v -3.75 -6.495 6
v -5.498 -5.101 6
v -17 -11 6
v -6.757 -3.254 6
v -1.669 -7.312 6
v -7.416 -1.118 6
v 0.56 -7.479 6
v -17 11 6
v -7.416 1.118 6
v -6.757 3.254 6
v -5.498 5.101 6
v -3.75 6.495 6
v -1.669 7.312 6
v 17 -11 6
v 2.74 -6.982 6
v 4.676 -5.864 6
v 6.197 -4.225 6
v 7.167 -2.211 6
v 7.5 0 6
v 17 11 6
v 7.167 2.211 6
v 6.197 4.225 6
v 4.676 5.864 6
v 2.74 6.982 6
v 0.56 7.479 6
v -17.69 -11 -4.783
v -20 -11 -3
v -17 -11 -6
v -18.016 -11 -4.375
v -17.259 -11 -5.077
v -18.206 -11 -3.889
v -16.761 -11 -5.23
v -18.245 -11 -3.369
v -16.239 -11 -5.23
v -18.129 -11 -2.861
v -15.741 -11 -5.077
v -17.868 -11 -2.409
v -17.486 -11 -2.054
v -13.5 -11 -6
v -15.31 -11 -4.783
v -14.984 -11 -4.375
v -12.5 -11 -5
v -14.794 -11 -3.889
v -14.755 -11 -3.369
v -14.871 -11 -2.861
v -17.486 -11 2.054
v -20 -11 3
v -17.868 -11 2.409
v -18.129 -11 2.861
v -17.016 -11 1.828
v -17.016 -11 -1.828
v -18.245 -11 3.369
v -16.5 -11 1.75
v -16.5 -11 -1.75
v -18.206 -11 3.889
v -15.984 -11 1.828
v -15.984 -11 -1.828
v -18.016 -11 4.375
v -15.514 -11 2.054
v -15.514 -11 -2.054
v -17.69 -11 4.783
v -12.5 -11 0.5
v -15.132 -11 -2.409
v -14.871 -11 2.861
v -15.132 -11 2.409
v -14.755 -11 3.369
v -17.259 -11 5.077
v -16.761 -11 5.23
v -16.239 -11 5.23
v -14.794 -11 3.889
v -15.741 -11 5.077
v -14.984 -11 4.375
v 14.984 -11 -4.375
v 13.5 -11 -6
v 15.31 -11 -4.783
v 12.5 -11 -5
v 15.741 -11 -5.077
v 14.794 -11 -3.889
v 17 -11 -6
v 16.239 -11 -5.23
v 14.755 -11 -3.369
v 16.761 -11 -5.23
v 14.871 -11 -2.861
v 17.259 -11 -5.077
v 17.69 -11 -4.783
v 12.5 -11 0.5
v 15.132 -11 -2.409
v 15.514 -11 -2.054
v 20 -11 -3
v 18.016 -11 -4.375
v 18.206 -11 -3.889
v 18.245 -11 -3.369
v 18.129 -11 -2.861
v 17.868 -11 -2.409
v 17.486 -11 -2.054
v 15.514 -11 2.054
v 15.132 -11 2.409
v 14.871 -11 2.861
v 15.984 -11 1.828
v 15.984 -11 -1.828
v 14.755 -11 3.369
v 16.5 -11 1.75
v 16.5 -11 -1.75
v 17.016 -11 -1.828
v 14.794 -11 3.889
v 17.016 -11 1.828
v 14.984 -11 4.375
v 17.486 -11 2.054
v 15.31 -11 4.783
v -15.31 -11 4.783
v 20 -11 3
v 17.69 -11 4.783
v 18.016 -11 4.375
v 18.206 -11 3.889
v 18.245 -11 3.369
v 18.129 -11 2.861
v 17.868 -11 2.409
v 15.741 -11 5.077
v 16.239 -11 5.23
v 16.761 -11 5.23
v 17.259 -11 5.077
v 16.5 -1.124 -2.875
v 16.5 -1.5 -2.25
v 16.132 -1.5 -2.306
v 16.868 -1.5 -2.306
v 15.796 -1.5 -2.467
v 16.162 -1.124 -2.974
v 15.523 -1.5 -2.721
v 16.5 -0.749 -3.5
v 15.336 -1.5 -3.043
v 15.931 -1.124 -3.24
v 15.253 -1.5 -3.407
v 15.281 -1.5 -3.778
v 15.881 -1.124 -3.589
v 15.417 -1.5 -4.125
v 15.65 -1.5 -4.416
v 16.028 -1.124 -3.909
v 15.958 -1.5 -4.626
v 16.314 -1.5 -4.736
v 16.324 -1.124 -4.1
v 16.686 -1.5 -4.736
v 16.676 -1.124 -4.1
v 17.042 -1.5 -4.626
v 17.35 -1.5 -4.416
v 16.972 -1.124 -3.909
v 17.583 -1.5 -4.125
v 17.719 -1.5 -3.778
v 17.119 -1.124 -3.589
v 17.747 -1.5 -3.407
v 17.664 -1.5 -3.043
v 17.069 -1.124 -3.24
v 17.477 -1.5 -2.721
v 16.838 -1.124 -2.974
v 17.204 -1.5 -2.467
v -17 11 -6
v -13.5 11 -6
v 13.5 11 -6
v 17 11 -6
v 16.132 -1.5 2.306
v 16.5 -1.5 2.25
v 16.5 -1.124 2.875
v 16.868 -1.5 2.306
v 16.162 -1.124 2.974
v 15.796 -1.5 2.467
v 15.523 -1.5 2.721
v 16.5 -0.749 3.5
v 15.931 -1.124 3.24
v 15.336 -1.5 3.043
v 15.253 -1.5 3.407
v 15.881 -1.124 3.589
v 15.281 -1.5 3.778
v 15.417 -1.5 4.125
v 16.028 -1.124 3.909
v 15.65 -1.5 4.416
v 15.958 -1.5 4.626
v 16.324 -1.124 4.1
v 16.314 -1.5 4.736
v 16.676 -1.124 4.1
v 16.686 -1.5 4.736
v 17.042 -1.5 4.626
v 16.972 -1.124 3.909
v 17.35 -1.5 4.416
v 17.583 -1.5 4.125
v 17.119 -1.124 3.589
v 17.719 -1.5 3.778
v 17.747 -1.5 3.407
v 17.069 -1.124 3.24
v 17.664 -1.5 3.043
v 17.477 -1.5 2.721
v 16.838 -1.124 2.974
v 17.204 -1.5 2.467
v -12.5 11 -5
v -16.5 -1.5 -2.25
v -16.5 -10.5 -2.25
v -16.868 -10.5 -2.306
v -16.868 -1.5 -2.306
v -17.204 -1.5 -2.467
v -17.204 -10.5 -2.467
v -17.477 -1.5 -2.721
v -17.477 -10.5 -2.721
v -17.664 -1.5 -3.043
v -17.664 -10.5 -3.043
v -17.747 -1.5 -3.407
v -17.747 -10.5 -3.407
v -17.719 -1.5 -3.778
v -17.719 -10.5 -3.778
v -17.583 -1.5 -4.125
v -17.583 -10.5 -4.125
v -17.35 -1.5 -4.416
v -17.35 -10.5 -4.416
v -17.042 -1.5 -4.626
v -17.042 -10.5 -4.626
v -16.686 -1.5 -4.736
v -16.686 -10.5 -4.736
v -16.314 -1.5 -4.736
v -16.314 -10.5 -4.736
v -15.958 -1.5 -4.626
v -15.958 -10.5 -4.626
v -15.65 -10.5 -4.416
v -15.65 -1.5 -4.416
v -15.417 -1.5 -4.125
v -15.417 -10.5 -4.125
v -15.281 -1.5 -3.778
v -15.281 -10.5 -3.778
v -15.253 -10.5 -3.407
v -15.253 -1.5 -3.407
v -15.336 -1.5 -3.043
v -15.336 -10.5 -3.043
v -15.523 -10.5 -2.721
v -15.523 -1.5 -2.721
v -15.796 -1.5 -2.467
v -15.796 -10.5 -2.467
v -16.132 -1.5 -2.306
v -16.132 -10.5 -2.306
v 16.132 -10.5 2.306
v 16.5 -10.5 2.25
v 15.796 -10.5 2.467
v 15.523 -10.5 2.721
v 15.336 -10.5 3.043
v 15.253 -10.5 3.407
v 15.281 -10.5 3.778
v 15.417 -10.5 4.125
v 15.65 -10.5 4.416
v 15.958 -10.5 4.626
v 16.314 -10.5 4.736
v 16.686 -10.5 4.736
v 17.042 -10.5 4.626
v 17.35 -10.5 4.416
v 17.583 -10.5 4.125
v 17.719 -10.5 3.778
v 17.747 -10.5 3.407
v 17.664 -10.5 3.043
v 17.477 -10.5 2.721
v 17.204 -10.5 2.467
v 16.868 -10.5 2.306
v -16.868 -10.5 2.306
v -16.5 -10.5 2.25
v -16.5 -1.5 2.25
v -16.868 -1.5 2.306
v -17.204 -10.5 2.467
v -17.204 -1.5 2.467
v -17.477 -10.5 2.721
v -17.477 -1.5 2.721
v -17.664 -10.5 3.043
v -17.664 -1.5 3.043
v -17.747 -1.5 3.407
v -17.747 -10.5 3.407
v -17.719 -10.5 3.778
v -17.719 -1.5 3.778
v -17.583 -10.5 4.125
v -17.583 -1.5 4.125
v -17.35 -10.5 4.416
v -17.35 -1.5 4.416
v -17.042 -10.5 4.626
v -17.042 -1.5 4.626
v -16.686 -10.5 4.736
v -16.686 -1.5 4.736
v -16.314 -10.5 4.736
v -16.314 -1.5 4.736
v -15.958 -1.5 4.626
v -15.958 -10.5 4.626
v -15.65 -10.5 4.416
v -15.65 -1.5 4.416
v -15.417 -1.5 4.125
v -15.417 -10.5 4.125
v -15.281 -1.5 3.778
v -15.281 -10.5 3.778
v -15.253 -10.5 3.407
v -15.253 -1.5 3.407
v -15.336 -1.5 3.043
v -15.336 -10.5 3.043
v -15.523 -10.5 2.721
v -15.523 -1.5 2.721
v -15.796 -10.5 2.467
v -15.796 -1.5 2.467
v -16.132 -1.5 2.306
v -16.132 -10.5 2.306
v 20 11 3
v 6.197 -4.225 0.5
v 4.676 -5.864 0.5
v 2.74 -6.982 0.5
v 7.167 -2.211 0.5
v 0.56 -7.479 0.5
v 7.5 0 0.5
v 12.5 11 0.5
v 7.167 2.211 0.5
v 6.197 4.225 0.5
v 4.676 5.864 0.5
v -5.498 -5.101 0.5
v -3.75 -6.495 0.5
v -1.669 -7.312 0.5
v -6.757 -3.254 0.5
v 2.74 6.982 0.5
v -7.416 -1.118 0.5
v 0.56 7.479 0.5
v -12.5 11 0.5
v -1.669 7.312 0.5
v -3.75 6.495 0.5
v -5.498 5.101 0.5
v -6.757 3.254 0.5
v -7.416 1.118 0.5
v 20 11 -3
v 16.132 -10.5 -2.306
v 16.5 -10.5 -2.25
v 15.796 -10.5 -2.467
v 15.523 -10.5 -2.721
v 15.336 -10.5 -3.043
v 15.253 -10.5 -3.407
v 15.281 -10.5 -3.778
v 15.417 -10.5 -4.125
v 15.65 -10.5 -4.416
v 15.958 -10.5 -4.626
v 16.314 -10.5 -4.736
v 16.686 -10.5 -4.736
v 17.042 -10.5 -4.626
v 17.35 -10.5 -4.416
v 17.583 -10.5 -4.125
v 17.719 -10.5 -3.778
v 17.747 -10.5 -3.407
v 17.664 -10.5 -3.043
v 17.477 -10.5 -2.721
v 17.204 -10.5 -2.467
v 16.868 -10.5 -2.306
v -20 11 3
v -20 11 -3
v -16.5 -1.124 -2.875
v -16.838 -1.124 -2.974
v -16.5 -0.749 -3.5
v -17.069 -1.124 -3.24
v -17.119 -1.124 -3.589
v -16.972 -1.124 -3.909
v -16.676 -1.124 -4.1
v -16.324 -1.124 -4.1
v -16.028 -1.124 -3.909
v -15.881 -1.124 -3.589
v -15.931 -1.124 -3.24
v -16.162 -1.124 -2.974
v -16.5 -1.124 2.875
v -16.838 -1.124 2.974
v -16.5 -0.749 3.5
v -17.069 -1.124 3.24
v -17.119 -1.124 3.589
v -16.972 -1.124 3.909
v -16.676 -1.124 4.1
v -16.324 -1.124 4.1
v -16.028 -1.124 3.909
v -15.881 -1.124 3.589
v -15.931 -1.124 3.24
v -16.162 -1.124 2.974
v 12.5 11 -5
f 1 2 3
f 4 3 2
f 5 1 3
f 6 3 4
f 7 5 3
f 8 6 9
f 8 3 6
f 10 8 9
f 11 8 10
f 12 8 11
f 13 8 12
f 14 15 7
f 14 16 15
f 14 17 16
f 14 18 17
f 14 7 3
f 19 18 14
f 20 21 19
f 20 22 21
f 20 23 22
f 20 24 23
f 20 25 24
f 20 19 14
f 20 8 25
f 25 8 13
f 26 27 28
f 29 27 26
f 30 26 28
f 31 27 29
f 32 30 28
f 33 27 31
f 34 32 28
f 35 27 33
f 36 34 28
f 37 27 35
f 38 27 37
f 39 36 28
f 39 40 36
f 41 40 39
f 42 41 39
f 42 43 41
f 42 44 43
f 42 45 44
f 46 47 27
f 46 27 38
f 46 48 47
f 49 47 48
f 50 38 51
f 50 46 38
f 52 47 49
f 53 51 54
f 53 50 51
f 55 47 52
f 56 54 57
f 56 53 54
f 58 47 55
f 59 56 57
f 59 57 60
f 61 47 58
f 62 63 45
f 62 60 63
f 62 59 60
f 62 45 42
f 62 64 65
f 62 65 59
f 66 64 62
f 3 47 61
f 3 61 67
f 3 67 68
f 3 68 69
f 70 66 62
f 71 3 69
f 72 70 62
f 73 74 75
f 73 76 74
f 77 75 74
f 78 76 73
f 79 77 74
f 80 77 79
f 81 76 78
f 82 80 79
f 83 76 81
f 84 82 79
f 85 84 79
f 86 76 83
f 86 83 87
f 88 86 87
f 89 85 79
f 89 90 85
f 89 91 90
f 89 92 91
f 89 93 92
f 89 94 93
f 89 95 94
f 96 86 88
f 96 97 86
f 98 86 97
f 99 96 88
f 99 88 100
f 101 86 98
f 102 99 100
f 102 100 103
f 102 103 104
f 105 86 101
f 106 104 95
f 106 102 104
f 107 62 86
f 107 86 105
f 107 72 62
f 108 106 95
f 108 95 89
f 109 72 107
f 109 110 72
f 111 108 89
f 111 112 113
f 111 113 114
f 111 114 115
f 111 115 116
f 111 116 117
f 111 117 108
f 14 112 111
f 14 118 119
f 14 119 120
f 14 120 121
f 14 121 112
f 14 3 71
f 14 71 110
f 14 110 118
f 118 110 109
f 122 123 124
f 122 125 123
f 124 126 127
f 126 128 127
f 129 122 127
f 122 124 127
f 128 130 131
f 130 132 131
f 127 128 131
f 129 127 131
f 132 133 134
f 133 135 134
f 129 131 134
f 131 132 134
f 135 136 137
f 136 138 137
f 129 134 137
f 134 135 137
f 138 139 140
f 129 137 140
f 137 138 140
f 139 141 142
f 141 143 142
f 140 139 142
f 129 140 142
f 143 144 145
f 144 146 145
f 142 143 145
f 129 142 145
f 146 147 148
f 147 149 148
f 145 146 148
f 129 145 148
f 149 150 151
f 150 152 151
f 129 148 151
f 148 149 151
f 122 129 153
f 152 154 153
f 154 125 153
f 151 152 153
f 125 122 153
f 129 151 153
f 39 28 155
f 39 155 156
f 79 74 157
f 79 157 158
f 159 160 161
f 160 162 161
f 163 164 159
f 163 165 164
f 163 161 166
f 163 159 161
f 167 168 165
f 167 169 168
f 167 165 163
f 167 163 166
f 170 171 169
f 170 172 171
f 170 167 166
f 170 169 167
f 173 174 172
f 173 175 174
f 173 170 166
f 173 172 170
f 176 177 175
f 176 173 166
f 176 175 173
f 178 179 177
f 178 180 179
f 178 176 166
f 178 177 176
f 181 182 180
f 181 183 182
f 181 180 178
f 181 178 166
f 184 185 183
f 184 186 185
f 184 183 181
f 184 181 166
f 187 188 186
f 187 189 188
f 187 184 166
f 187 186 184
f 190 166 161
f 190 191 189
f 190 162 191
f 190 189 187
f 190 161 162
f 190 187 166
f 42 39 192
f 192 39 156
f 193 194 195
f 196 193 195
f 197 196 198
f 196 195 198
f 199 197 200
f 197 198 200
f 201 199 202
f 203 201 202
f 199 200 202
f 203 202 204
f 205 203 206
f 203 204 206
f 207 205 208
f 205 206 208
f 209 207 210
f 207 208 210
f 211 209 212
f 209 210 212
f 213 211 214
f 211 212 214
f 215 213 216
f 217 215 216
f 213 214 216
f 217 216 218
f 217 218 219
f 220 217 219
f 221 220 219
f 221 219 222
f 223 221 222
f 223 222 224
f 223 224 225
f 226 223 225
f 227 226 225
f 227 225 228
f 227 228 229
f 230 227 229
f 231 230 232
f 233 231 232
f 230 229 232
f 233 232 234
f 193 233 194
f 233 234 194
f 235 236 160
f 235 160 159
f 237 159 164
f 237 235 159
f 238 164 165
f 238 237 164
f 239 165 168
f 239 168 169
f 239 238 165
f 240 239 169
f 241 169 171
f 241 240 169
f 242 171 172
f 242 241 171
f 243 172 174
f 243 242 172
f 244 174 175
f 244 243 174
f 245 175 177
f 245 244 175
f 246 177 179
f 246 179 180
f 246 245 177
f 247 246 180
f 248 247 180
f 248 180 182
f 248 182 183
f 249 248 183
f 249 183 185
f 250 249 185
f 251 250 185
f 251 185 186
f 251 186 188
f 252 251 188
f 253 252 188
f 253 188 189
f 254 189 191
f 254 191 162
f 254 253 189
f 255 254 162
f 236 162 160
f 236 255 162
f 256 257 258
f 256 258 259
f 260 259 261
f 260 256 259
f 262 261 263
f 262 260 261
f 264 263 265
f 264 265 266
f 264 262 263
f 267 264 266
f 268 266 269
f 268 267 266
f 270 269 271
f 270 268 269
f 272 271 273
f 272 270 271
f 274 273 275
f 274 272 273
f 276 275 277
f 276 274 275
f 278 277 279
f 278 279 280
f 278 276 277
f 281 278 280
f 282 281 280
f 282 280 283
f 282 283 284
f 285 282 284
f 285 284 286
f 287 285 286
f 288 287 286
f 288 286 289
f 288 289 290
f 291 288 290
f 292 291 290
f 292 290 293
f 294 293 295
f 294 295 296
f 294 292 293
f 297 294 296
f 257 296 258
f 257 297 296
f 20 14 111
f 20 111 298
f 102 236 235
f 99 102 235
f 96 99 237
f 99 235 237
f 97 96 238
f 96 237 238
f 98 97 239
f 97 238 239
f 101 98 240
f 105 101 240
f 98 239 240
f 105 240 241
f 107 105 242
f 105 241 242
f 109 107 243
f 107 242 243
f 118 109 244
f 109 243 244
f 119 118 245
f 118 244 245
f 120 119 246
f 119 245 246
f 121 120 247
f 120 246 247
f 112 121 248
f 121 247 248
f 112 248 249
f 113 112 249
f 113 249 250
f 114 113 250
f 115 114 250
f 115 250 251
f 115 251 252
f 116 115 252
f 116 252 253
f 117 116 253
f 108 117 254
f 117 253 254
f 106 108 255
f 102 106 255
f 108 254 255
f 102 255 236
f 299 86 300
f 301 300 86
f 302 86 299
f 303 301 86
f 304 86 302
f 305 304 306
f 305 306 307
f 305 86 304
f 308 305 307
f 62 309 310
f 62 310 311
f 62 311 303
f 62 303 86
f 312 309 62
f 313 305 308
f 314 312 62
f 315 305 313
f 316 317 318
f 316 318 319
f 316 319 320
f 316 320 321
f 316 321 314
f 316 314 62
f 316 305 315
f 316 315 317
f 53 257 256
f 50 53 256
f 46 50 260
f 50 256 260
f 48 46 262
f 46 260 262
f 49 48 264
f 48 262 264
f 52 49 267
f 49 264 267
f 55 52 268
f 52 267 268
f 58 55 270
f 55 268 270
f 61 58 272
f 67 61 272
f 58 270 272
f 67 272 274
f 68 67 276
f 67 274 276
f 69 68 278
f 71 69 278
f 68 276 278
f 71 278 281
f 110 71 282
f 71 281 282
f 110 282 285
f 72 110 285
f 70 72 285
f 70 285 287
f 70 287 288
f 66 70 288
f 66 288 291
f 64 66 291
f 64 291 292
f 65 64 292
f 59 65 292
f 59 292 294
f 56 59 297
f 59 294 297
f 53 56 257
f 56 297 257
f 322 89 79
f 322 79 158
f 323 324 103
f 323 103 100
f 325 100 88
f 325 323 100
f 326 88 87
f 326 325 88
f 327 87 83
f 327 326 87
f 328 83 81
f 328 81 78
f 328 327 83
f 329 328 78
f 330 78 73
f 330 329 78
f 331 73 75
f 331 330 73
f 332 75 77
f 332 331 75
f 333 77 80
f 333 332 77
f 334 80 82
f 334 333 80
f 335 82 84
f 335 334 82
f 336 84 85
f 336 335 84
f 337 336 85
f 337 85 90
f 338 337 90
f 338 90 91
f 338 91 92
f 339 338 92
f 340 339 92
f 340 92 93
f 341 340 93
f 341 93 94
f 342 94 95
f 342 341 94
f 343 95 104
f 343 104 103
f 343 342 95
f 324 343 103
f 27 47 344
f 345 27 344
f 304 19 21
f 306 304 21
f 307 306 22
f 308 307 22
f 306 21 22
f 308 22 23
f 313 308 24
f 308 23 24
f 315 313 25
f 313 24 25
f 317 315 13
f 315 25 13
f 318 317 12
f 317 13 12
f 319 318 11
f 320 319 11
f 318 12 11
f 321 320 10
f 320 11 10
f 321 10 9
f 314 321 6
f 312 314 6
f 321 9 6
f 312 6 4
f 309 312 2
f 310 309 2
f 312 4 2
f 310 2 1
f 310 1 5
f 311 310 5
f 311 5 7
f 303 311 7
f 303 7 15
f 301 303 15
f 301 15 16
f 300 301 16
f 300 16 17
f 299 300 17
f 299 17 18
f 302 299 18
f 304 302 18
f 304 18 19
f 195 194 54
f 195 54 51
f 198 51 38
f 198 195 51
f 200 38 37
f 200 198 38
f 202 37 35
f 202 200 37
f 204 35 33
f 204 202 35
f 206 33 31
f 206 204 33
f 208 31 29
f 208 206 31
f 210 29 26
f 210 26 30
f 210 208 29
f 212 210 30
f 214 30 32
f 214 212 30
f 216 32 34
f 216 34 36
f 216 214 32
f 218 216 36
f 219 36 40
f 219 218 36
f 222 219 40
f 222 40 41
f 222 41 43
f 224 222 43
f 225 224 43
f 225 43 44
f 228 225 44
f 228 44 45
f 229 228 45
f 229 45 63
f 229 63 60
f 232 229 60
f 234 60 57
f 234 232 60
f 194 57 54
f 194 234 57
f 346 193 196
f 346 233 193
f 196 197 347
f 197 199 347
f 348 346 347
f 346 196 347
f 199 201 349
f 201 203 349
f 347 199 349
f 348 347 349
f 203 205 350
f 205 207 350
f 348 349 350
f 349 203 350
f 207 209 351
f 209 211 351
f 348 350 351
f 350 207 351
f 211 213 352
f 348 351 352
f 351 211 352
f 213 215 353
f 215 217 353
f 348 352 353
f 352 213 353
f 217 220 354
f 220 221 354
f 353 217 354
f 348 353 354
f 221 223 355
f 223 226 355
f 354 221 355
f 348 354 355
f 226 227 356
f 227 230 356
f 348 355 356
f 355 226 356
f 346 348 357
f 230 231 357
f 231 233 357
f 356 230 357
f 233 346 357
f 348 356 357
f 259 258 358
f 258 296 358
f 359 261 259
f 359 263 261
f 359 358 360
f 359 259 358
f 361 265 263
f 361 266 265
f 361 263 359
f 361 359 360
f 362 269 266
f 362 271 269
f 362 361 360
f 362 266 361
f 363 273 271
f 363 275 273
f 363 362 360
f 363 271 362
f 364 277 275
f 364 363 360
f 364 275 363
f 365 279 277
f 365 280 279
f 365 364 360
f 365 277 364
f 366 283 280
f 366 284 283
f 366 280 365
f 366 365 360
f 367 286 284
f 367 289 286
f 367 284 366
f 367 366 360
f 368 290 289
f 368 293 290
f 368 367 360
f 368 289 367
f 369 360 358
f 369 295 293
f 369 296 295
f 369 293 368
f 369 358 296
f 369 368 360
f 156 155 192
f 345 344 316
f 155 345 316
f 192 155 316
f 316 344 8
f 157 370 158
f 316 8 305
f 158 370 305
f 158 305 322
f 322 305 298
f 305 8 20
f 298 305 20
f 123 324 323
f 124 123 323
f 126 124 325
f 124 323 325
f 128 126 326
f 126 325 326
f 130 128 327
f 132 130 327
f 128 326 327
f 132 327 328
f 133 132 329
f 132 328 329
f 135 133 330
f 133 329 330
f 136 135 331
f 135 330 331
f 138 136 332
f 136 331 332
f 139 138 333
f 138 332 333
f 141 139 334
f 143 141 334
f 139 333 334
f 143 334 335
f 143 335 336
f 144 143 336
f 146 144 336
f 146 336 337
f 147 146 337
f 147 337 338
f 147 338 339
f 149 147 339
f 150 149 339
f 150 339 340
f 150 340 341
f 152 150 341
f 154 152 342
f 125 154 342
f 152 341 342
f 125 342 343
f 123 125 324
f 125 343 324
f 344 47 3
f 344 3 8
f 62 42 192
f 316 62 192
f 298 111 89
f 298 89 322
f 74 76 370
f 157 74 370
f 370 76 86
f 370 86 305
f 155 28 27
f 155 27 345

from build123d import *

# Parameters (mm, degrees)
SKETCH_1_W                 = 40
SKETCH_1_H                 = 22
EXTRUDE_1_DEPTH            = 6
M3_TAPPED_HOLE1_AT_2_COUNT = 2
M3_TAPPED_HOLE1_AT_2_PITCH = 33
CHAMFER_1_SIZE             = 0.5
SKETCH_5_R                 = 7.5
CUT_EXTRUDE_2_DEPTH        = 12
CHAMFER1_SIZE              = 0.5
SKETCH2_W                  = 25
SKETCH2_H                  = 22
EXTRUDE2_DEPTH             = 6.5
CHAMFER2_SIZE              = 1
CHAMFER3_SIZE              = 3


with BuildPart() as part:
    # 草图1 → 拉伸1 (new, symmetric)
    with BuildSketch(Plane.XY):
        Rectangle(SKETCH_1_W, SKETCH_1_H)
    extrude(amount=EXTRUDE_1_DEPTH, both=True)

    # 草图4 → M3 Tapped Hole1 (revolve, cut)
    with BuildSketch(Plane(origin=(-16.5, -11, 3.5), x_dir=(0, 0, -1), z_dir=(1, 0, 0))):
        Polygon((0, 0), (0, 10.251075774), (1.25, 9.5), (1.25, 0), align=None)
    m3_tapped_hole1 = revolve(axis=Axis((-16.5, -17.35, 3.5), (0, 1, 0)), mode=Mode.SUBTRACT)

    # M3 Tapped Hole1 at 2: M3 Tapped Hole1 ×2
    with Locations(*[(i * M3_TAPPED_HOLE1_AT_2_PITCH, 0, 0) for i in range(1, M3_TAPPED_HOLE1_AT_2_COUNT)]):
        add(m3_tapped_hole1, mode=Mode.SUBTRACT)

    # 倒角1
    chamfer_1_edges = [part.edges().sort_by_distance(p)[0] for p in [
        (16.5, -11, 4.75),
        (-16.5, -11, 4.75),
    ]]
    chamfer(chamfer_1_edges, length=CHAMFER_1_SIZE)

    # 草图5 → 拉伸2 (cut)
    with BuildSketch(Plane.XY.offset(6)):
        Circle(SKETCH_5_R)
    extrude(amount=-CUT_EXTRUDE_2_DEPTH, mode=Mode.SUBTRACT)

    # Mirror1: M3 Tapped Hole1 across plane
    add(m3_tapped_hole1.mirror(Plane.XY), mode=Mode.SUBTRACT)

    # Mirror1 copy 1 sketch → Mirror1 copy 1 (revolve, cut)
    with BuildSketch(Plane(origin=(16.5, -11, -3.5), x_dir=(0, 0, 1), z_dir=(1, 0, 0))):
        Polygon((0, 0), (0, -10.251075774), (1.25, -9.5), (1.25, 0), align=None)
    revolve(axis=Axis((16.5, -17.35, -3.5), (0, -1, 0)), mode=Mode.SUBTRACT)

    # Chamfer1
    chamfer1_edges = [part.edges().sort_by_distance(p)[0] for p in [
        (16.5, -11, -4.75),
        (-16.5, -11, -4.75),
    ]]
    chamfer(chamfer1_edges, length=CHAMFER1_SIZE)

    # Sketch2 → Extrude2 (cut)
    with BuildSketch(Plane(origin=(0, 0, -6), x_dir=(-1, 0, 0), z_dir=(0, 0, -1))):
        Rectangle(SKETCH2_W, SKETCH2_H)
    extrude(amount=-EXTRUDE2_DEPTH, mode=Mode.SUBTRACT)

    # Chamfer2
    chamfer2_edges = [part.edges().sort_by_distance(p)[0] for p in [
        (12.5, 0, -6),
        (-12.5, 0, -6),
    ]]
    chamfer(chamfer2_edges, length=CHAMFER2_SIZE)

    # Chamfer3
    chamfer3_edges = [part.edges().sort_by_distance(p)[0] for p in [
        (20, 0, 6),
        (-20, 0, 6),
        (20, 0, -6),
        (-20, 0, -6),
    ]]
    chamfer(chamfer3_edges, length=CHAMFER3_SIZE)


solid = part.part
